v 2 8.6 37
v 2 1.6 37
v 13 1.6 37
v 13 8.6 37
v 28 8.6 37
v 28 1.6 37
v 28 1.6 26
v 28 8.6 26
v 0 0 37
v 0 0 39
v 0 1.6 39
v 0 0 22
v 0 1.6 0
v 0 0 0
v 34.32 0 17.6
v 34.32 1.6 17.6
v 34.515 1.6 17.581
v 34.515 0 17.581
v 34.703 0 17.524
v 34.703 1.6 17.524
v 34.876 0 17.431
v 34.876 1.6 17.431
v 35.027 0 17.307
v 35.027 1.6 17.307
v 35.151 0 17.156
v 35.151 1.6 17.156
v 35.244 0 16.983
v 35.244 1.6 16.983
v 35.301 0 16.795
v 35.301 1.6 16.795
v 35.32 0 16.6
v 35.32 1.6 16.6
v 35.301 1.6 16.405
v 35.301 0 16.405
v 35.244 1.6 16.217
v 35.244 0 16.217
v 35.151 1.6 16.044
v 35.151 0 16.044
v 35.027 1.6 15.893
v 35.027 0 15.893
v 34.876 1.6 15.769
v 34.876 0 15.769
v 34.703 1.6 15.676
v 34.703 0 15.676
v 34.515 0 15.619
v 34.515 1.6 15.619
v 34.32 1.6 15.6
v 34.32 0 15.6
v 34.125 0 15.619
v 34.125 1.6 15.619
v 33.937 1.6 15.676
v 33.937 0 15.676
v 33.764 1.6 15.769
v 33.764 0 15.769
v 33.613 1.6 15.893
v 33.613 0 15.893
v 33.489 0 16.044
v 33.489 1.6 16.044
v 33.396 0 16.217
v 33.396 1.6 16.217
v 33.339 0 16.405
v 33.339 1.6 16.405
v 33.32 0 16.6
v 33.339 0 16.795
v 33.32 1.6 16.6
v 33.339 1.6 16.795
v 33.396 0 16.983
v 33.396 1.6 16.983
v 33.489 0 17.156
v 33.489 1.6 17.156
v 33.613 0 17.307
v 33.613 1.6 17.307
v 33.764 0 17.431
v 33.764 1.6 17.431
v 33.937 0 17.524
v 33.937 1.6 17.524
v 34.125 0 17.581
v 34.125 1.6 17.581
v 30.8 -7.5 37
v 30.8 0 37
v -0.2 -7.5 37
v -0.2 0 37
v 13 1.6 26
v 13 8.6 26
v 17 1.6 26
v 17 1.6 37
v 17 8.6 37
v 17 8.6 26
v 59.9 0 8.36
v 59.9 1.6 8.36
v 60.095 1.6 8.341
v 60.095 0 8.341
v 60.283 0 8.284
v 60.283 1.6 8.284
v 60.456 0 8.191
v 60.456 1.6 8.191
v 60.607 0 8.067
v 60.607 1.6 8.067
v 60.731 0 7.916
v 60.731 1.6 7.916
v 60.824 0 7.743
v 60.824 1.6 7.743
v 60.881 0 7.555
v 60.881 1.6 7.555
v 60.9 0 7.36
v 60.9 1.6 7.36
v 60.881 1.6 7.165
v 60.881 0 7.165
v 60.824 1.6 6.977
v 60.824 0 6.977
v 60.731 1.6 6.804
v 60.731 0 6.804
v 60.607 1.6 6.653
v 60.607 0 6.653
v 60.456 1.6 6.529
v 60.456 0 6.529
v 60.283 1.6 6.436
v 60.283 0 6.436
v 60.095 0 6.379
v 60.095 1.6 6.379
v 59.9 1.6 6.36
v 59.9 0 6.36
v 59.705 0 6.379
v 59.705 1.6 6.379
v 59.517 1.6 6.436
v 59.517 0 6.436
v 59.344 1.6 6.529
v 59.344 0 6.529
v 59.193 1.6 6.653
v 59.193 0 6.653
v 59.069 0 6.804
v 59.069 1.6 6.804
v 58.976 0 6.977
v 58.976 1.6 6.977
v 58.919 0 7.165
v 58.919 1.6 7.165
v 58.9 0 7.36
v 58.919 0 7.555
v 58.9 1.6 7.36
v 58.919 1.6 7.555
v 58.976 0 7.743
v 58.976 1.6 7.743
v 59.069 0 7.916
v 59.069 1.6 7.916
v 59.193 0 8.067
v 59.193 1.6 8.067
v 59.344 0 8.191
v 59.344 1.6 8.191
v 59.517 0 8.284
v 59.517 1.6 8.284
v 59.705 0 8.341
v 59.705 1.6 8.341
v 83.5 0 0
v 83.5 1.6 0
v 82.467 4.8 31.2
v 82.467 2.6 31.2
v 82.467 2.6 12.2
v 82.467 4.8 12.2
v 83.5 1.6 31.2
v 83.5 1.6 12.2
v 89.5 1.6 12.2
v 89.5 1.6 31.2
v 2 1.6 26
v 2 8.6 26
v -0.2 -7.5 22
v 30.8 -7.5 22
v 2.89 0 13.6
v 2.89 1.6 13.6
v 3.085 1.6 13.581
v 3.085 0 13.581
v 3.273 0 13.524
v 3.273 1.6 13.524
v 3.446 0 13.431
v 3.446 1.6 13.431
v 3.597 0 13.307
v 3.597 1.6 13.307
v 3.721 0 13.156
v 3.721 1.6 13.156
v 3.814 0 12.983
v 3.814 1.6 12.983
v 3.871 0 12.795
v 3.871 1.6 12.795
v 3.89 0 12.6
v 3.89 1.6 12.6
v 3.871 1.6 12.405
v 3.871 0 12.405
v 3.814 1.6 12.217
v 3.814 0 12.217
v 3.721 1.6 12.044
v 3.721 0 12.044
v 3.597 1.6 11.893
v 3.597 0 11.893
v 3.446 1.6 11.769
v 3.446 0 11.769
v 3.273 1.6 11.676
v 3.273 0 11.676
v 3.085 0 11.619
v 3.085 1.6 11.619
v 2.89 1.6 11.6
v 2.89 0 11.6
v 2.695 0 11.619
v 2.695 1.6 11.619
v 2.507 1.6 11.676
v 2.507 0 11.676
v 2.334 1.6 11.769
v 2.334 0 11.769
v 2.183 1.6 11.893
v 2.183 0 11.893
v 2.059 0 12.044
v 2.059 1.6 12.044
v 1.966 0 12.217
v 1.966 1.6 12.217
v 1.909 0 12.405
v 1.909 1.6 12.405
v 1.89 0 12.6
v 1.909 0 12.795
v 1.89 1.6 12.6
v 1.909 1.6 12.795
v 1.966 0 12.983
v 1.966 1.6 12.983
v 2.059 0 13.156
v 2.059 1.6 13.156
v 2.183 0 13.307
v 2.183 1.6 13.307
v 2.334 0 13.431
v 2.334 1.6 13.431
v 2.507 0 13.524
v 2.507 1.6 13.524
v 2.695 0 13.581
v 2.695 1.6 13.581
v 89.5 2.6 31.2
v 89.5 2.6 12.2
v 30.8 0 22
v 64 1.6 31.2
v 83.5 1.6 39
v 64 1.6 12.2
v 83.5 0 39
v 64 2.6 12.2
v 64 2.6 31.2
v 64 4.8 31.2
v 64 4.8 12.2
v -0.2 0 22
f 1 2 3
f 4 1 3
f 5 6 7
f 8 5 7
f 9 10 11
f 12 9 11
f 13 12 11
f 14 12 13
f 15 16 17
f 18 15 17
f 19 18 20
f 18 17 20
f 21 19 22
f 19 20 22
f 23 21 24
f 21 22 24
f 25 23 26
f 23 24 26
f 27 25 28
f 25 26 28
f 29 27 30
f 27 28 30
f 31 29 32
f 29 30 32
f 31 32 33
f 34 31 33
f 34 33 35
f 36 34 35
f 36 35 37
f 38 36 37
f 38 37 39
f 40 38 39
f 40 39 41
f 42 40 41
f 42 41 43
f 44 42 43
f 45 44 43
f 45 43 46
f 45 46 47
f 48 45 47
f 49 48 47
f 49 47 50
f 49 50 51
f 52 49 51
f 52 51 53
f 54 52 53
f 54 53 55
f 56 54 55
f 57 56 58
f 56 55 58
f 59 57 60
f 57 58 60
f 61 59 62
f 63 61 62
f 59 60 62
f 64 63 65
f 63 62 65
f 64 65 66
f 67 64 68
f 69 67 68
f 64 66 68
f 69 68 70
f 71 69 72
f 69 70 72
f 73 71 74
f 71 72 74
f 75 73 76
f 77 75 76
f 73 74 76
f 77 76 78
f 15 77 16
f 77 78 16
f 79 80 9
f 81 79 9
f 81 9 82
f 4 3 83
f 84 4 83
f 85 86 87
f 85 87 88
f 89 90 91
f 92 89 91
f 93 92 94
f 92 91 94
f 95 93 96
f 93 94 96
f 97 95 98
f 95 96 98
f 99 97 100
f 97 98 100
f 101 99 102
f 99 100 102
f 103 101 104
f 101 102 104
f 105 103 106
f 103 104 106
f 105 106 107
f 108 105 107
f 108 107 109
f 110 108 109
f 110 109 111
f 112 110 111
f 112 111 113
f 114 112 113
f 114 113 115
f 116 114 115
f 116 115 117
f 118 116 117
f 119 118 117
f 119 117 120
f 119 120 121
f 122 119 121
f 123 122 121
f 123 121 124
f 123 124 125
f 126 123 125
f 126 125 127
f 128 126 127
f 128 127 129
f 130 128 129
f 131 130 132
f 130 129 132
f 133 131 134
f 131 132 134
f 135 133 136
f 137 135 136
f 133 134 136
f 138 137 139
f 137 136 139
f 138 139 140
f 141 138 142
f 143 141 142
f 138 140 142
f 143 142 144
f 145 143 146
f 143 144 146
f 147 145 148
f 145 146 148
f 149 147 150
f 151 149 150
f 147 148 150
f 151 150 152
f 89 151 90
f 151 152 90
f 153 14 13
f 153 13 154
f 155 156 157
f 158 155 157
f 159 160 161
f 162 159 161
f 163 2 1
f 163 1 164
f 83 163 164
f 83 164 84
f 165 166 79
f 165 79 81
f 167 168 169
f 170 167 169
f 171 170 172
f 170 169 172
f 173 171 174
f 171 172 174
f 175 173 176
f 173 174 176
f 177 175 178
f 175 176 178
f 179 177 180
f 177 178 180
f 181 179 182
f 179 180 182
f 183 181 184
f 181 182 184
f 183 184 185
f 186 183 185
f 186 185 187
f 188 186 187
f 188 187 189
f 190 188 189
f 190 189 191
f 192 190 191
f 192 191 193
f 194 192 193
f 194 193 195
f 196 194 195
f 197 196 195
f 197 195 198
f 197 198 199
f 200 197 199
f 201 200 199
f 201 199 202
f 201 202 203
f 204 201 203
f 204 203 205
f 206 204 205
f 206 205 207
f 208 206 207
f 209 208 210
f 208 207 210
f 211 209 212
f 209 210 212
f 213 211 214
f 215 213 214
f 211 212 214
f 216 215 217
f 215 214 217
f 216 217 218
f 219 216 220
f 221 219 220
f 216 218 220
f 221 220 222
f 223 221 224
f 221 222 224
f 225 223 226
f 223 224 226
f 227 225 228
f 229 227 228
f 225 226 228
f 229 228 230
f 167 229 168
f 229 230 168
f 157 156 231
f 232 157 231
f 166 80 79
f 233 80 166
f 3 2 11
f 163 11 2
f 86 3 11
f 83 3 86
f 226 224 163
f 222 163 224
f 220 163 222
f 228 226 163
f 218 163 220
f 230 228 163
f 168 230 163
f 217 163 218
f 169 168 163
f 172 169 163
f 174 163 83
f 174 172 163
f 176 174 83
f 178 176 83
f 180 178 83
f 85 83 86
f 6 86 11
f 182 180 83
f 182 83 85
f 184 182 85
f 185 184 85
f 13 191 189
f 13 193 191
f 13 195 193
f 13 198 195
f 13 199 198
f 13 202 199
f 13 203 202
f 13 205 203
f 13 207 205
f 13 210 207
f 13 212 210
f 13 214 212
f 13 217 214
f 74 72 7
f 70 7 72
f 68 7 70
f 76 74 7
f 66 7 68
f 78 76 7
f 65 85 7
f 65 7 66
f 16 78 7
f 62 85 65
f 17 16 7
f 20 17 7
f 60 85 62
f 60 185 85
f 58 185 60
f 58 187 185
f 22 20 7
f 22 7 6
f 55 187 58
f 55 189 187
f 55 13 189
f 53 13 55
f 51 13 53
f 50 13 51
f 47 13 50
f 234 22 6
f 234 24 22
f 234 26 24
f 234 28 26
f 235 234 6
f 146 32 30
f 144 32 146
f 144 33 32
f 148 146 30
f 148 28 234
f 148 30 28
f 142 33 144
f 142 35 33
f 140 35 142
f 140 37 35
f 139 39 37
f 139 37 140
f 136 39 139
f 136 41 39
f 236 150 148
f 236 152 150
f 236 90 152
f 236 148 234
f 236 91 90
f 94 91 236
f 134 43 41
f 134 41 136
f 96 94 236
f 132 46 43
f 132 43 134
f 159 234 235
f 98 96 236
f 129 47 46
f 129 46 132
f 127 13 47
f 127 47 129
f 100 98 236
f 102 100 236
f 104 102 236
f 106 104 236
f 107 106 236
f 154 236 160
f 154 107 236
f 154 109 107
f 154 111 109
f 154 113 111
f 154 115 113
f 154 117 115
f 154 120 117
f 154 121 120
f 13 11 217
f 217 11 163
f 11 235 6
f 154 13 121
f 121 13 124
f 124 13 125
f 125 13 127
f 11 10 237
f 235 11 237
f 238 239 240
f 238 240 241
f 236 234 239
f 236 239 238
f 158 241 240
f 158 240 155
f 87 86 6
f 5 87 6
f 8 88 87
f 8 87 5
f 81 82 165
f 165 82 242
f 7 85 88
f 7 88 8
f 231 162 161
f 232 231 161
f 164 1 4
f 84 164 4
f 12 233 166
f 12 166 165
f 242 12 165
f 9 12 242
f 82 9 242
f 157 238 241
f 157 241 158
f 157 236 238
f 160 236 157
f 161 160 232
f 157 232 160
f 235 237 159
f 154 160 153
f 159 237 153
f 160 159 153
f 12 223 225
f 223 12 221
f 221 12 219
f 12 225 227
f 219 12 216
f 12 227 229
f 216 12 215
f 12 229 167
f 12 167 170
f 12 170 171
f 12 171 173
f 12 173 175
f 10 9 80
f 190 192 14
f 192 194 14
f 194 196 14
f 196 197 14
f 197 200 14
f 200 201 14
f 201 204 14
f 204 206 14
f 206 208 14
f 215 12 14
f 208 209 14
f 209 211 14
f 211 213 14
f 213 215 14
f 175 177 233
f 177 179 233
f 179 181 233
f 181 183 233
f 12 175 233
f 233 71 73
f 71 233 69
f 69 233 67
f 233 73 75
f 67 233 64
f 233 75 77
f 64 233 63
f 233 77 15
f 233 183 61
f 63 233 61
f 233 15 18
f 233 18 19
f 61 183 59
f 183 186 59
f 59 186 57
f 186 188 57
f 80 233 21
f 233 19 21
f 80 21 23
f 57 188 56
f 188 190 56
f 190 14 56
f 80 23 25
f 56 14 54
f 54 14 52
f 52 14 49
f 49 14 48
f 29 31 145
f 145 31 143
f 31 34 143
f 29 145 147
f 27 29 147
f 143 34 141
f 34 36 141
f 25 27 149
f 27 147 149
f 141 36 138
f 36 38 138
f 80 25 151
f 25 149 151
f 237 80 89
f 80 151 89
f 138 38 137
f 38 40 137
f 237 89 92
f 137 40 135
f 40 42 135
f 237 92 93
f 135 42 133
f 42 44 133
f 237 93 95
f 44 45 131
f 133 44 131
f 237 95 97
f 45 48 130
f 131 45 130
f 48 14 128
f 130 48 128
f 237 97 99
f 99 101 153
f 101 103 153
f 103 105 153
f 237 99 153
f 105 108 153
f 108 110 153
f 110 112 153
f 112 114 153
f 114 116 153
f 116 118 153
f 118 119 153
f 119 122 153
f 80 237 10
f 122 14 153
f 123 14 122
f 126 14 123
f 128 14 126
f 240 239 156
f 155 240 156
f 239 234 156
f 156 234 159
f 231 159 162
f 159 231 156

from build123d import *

# Parameters (mm, degrees)
SKETCH2_W           = 83.5
SKETCH2_H           = 39
BOSS_EXTRUDE1_DEPTH = 1.6
SKETCH3_W           = 25.5
SKETCH3_H           = 19
BOSS_EXTRUDE2_DEPTH = 1
SKETCH4_W           = 18.466737103
SKETCH4_H           = 19
BOSS_EXTRUDE3_DEPTH = 2.2
SKETCH5_R           = 1
CUT_EXTRUDE1_DEPTH  = 2.2
SKETCH6_W           = 11
SKETCH6_H           = 11
BOSS_EXTRUDE4_DEPTH = 7
SKETCH7_W           = 31
SKETCH7_H           = 15
BOSS_EXTRUDE5_DEPTH = 7.5


with BuildPart() as part:
    # Sketch2 → Boss-Extrude1 (new body)
    with BuildSketch(Plane(origin=(0, 0, 0), x_dir=(1, 0, 0), z_dir=(0, 1, 0))):
        with Locations((41.75, -19.5)):
            Rectangle(SKETCH2_W, SKETCH2_H)
    extrude(amount=BOSS_EXTRUDE1_DEPTH)

    # Sketch3 → Boss-Extrude2 (add)
    with BuildSketch(Plane(origin=(0, 1.6, 0), x_dir=(1, 0, 0), z_dir=(0, 1, 0))):
        with Locations((76.75, -21.7)):
            Rectangle(SKETCH3_W, SKETCH3_H)
    extrude(amount=BOSS_EXTRUDE2_DEPTH)

    # Sketch4 → Boss-Extrude3 (add)
    with BuildSketch(Plane(origin=(0, 2.6, 0), x_dir=(1, 0, 0), z_dir=(0, 1, 0))):
        with Locations((73.233368552, -21.7)):
            Rectangle(SKETCH4_W, SKETCH4_H)
    extrude(amount=BOSS_EXTRUDE3_DEPTH)

    # Sketch5 → Cut-Extrude1 (cut)
    with BuildSketch(Plane(origin=(0, 1.6, 0), x_dir=(1, 0, 0), z_dir=(0, 1, 0))):
        with Locations(Location((59.9, -7.36, 0), (0, 0, 270))):
            Circle(SKETCH5_R)
        with Locations(Location((34.32, -16.6, 0), (0, 0, 270))):
            Circle(SKETCH5_R)
        with Locations(Location((2.89, -12.6, 0), (0, 0, 270))):
            Circle(SKETCH5_R)
    extrude(amount=-CUT_EXTRUDE1_DEPTH, mode=Mode.SUBTRACT)

    # Sketch6 → Boss-Extrude4 (add)
    with BuildSketch(Plane(origin=(0, 1.6, 0), x_dir=(1, 0, 0), z_dir=(0, 1, 0))):
        with Locations((7.5, -31.5)):
            Rectangle(SKETCH6_W, SKETCH6_H)
        with Locations((22.5, -31.5)):
            Rectangle(SKETCH6_W, SKETCH6_H)
    extrude(amount=BOSS_EXTRUDE4_DEPTH)

    # Sketch7 → Boss-Extrude5 (add)
    with BuildSketch(Plane(origin=(0, 0, 0), x_dir=(-1, 0, 0), z_dir=(0, -1, 0))):
        with Locations((-15.3, -29.5)):
            Rectangle(SKETCH7_W, SKETCH7_H)
    extrude(amount=BOSS_EXTRUDE5_DEPTH)


solid = part.part
